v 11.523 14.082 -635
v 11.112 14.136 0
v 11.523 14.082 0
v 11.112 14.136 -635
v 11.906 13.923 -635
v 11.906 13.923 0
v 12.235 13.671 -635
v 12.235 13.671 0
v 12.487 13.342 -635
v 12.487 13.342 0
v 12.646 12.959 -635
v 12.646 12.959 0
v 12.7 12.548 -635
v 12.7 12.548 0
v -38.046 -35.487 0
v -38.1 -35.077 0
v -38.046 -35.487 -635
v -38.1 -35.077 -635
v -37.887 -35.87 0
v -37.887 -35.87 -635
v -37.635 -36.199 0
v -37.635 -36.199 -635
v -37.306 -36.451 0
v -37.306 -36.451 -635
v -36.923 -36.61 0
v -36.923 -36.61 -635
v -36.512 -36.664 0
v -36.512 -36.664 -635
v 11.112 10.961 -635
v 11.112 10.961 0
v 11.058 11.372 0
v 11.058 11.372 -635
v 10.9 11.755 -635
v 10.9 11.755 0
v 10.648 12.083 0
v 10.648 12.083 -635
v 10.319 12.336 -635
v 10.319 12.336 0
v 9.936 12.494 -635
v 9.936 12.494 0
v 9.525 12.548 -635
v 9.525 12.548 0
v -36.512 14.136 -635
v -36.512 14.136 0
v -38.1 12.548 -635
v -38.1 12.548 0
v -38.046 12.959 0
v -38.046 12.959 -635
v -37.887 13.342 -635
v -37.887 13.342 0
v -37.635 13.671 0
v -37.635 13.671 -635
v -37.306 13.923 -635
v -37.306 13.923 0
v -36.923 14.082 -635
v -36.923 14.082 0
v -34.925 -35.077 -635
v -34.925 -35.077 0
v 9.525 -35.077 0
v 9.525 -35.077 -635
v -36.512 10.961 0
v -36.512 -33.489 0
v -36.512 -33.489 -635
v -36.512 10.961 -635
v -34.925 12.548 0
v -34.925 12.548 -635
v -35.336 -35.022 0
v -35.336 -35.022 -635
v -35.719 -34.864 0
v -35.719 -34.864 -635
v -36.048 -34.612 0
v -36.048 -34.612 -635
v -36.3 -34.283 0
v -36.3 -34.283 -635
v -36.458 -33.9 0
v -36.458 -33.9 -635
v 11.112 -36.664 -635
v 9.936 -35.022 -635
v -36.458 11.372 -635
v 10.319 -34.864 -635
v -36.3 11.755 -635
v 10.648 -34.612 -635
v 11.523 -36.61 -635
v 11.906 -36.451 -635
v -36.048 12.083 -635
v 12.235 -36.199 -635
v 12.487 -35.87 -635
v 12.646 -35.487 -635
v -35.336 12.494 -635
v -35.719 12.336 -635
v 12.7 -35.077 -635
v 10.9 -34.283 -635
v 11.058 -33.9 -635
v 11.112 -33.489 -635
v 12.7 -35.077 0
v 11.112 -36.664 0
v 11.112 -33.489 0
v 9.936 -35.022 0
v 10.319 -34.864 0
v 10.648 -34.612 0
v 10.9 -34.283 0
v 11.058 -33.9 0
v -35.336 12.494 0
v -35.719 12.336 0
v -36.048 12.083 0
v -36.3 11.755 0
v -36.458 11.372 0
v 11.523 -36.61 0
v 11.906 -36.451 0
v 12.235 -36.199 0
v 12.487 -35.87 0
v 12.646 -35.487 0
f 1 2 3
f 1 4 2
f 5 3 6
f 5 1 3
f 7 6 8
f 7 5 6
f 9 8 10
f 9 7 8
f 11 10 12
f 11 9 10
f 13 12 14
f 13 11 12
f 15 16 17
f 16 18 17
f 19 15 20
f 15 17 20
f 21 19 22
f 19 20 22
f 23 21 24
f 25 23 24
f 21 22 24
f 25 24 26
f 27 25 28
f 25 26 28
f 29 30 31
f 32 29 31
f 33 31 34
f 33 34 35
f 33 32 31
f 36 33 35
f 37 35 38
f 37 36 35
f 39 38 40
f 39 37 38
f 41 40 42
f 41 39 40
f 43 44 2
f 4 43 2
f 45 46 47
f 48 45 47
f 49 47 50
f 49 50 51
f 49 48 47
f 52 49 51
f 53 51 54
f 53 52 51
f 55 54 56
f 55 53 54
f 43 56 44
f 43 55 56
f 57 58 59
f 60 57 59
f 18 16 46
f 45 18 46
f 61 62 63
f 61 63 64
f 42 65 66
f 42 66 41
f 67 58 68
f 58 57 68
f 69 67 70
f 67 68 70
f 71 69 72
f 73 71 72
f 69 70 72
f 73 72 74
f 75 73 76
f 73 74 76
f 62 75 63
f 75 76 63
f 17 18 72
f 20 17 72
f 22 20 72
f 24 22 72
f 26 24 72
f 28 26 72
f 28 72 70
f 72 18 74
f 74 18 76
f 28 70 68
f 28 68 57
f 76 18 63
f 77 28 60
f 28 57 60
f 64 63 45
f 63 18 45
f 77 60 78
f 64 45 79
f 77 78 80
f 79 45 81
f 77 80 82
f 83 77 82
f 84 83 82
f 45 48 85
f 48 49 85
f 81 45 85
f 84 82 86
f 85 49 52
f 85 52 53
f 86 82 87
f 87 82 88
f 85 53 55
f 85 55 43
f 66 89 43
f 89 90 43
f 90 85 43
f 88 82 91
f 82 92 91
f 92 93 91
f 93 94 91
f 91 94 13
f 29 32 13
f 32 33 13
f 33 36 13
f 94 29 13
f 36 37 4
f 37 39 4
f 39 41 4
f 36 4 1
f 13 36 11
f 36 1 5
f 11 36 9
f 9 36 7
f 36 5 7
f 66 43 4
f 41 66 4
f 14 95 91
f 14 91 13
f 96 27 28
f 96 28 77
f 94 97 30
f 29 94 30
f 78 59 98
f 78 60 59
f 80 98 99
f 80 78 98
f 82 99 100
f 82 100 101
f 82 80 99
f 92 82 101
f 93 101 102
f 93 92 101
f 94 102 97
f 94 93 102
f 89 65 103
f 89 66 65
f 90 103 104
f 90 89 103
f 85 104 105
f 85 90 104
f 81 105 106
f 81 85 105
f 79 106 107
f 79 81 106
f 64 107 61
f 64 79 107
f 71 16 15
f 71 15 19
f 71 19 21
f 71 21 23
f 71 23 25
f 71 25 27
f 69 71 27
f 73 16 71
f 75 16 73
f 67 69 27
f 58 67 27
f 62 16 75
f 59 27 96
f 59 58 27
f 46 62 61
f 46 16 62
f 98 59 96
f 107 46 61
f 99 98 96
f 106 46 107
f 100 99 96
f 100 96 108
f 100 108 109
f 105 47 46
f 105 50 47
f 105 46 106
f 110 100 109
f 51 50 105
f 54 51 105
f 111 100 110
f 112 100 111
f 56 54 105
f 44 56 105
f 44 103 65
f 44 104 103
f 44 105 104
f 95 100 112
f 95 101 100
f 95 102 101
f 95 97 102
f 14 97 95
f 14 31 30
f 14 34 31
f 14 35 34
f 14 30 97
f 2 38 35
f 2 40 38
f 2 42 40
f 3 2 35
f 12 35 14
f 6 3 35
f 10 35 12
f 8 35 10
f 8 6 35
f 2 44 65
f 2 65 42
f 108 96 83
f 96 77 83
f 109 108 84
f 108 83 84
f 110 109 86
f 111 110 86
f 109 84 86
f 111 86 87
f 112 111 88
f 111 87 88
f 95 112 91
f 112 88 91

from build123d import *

# Parameters (mm, degrees)
F0_W     = 50.8
F0_H     = 50.8
F0_W_2   = 47.625
F0_H_2   = 47.625
F1_DEPTH = 635
F2_R     = 1.5875
F3_R     = 1.5875


with BuildPart() as f1:
    # F0 (on Top) → F1 (new body)
    with BuildSketch(Plane.XY):
        with Locations((-12.7, -11.264074)):
            Rectangle(F0_W, F0_H)
        with Locations((-12.7, -11.264074)):
            Rectangle(F0_W_2, F0_H_2, mode=Mode.SUBTRACT)
    extrude(amount=-F1_DEPTH)

    # F2
    f2_edges = [f1.edges().sort_by_distance(p)[0] for p in [
        (-38.1, -36.664074, -317.5),
        (12.7, -36.664074, -317.5),
        (12.7, 14.135926, -317.5),
        (-38.1, 14.135926, -317.5),
    ]]
    fillet(f2_edges, radius=F2_R)

    # F3
    f3_edges = [f1.edges().sort_by_distance(p)[0] for p in [
        (-36.5125, 12.548426, -317.5),
        (11.1125, 12.548426, -317.5),
        (11.1125, -35.076574, -317.5),
        (-36.5125, -35.076574, -317.5),
    ]]
    fillet(f3_edges, radius=F3_R)


solid = f1.part
